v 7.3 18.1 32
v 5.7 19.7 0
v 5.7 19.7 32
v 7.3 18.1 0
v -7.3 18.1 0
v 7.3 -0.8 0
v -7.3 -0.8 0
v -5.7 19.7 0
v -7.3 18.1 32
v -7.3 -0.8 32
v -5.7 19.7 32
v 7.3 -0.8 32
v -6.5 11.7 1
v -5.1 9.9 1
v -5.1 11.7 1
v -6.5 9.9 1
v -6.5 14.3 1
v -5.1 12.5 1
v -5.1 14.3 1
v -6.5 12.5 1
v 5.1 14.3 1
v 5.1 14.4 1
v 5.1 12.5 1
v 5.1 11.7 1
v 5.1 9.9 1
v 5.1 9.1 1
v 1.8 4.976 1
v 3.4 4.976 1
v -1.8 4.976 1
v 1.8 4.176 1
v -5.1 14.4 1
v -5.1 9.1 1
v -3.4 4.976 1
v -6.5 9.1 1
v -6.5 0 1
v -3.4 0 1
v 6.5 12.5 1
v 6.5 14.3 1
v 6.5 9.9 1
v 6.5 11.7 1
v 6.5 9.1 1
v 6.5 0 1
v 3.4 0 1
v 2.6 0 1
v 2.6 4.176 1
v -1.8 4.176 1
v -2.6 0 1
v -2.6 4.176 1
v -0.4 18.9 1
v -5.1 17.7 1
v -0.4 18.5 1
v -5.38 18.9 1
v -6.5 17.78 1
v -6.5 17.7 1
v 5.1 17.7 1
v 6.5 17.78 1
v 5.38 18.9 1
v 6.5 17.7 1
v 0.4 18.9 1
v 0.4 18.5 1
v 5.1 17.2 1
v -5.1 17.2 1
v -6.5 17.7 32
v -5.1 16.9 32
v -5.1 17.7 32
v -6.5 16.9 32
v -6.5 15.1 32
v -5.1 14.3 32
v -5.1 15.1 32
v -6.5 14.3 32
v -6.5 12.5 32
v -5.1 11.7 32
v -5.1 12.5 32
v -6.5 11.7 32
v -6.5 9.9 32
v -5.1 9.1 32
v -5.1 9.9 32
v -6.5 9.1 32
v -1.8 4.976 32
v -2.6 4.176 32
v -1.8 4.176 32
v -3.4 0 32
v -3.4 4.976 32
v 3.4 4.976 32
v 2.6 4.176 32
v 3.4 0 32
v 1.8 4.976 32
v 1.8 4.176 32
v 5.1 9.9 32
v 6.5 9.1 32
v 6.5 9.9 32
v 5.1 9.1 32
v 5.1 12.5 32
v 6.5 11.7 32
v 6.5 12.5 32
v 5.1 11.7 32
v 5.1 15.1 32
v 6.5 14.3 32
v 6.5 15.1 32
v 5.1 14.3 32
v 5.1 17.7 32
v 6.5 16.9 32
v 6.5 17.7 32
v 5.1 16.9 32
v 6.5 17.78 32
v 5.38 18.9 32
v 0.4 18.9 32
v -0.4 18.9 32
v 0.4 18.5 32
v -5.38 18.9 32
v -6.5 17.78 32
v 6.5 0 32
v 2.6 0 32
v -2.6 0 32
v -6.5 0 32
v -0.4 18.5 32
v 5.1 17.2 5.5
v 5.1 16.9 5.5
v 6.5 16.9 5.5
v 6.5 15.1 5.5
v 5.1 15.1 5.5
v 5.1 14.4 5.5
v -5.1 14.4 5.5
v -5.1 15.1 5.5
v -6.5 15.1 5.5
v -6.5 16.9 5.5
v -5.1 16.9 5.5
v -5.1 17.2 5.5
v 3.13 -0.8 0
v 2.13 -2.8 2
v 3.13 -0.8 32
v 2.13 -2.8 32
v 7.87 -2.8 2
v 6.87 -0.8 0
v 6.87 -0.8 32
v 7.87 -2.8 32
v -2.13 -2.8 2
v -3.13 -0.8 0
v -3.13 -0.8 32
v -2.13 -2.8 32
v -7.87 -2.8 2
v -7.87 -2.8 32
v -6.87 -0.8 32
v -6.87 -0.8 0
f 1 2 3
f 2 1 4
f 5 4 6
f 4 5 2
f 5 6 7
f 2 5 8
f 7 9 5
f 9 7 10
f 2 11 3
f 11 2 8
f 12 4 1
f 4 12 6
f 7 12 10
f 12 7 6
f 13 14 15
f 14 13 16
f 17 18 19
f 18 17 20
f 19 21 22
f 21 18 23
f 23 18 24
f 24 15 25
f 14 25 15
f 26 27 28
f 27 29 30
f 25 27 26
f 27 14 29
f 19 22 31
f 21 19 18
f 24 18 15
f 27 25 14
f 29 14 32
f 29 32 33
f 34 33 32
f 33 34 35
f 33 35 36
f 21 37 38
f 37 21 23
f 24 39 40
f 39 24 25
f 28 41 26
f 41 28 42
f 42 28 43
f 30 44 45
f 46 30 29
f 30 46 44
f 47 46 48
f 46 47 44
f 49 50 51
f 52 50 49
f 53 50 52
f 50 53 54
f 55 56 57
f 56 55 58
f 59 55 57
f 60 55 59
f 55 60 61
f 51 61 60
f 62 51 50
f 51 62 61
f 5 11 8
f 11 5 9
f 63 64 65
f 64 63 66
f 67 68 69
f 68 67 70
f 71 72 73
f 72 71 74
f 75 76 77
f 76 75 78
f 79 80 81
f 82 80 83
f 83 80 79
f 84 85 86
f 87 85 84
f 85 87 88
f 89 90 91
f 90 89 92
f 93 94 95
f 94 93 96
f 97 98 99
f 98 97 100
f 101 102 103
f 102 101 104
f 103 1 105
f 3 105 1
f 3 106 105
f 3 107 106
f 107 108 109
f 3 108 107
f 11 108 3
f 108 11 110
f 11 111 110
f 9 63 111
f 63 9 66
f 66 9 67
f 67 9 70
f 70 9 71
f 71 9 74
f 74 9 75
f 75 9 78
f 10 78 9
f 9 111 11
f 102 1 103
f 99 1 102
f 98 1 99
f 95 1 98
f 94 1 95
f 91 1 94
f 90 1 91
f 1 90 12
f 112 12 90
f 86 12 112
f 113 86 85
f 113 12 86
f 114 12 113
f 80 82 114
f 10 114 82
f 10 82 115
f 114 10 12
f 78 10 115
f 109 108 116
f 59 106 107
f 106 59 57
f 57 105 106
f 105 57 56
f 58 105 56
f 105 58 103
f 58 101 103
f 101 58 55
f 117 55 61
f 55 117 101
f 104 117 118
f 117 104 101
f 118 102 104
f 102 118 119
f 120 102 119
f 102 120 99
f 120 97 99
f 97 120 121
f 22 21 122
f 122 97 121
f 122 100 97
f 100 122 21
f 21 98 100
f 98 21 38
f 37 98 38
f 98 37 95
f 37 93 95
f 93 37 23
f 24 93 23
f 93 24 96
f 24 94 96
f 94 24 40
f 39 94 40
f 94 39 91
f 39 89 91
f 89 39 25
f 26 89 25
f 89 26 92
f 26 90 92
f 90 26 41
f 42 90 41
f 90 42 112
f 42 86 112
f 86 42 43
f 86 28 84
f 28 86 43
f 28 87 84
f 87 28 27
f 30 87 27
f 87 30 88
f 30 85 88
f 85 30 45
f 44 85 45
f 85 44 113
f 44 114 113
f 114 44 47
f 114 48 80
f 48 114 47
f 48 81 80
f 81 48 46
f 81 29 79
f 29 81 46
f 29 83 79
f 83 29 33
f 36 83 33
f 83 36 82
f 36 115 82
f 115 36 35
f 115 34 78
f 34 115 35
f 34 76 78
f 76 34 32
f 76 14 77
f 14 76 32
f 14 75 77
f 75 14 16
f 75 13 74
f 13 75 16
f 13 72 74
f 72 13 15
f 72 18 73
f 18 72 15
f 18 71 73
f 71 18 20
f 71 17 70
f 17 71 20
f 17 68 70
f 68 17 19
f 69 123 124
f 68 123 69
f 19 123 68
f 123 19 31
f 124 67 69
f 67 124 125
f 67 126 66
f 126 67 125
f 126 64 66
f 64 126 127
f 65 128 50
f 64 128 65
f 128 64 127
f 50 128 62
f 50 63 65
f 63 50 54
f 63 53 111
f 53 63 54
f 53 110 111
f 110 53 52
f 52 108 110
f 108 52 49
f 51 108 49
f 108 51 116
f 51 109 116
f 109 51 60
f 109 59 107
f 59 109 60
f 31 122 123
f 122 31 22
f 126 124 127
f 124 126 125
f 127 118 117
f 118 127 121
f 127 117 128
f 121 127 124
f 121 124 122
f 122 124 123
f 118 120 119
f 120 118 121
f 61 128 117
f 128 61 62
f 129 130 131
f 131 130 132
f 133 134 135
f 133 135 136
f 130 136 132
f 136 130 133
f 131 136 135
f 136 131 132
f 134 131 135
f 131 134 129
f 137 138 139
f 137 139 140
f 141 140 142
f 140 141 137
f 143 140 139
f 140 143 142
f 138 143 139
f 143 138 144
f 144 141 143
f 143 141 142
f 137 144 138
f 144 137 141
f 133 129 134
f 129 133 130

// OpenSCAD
// Gehause fuer Hallsensoren des Ankerkettenzaehlers
// 
// 
// Background:
//   - siehe auch Hallsensoren_brd.pdf
//   - Der Sensor wird ueber ein Kabel mit dem 
//     Ankerkettenzaehler von Thomas Gerner verbunden
//   - Am Winschgehaeuse wird eine Montageplatte angeklebt,
//     und das Sensorgehaeuse daraufgeschoben. Die Bauhoehe
//     der Montageplatte plus Sensor darf 25mm nicht ueberschreiten,
//     aber auch nicht wesentlich darunter liegen, damit der Abstand
//     zu den Magneten klein bleibt.
//   - repository: https://github.com/Github6am/am_parts3D
//   - CAD manual: http://www.openscad.org/documentation.html
//
//   - offene Fragen:
//     - wieviel Hoehe braucht der Kleber? derzeit Gesamthoehe 24mm
//     - Schrumpfschlauch auf Kabel ? oder anderer Knickschutz?
//     - board Masse?
//     - Sollen die Sensoren grob in der Board-Flucht liegen oder Z-foermig?
//       ersteres fuehrt zu einem laengeren Gehaeuse.
//
// Andreas Merz 2019-07-20, v0.2 
// GPLv3 or later, see http://www.gnu.org/licenses


// import dovetail and mounting plate definitions
use <raspi_RJ45fix.scad>

// Main dimensions
xbrd=13;       // board width
zbrd=20+8.5;   // board length: 20, Sensors: 8.5
dbrd=1.7;      // board thickness
yout=24-3.5;   // sensor space - mounting plate thickness
wall=0.8;      // wall thickness

//-------------------------------------------
// enclosure for Hallsensor board and wire
//-------------------------------------------
// Die Bauhoehe samt 
module sensorcase2Dhalf() {
    w=wall;      // w: wall thickness
    u=0;         // excess wall thickness at lower part of the case, optional
    c=0.1;       // clearance between ridges
    x=xbrd/2;    // half board width
    y=yout-2*w;  // inner y dimension
    d=dbrd;      // board thickness
    xc=w/2;      // half width of top center ridge
    xf=5/2+c;    // half distance of cable clamp ridges
    xi=x-1.4;    // inset of board fixture
    yf=xf+sqrt((2*xf-w)*w)-0.3+u;  // cable clamp ridge hook
    yk=y-2;      // board 2mm from top
    yj=yk-d-w-c;
    yi=yj-d-w-c;
    yh=yi-d-w-c;
    yc=y-w/2;
    // inner contour
    polygon( points=[[0,u],
       // Kabelhalterung
       [xf,u], [xf,yf],[xf-w,yf],[xf-w,yf+w],[xf+w,yf+w],[xf+w,u],
       [x-u,u],
       // Platinenhalterung
       [x-u,yh],[xi,yh],[xi,yh+w],[x,yh+w],
       [x,yi],  [xi,yi],[xi,yi+w],[x,yi+w],
       [x,yj],  [xi,yj],[xi,yj+w],[x,yj+w],
       [x,yk],  [xi,yk],[xi,yk+w],[x,yk+w],
       // abgeschraegte Ecke
       [x,y-w*1.4],[x-w*1.4,y],
       // Mittelsteg
       [xc,y],[xc,yc],[0,yc],
       // outer contour
       [0,y+w],[x-w,y+w], [x+w,y-w],[x+w,-w],[0,-w]]); // outer contour

}

module sensorcase2D() {
          union() {
             sensorcase2Dhalf();
             mirror() sensorcase2Dhalf();
          }
}

module sensorcase() {
    w=wall;             // w: wall thickness
    hb=1.0;             // bottom
    hc=4.5+hb;          // sensor space depth
    yc=1.7;             // sensor space height
    h=zbrd+hb+2.5;  // overall height, including bottom wall
    x=xbrd/2;           // half board width
    y=yout-2*w;         // inner y dimension

    difference() {
      union() {
          linear_extrude(height = hb) hull() { sensorcase2D(); };  // bottom
          linear_extrude(height = h) 
            sensorcase2D();
          linear_extrude(height = hc)   // sensor support
            polygon( points=[[-x,y-yc],[x,y-yc],[x,y-yc-2-w],[-x,y-yc-2-w]]);
          linear_extrude(height = h)
             translate([ 5,-w,0]) rotate(180) schwalbenschwanz();
          linear_extrude(height = h)
             translate([-5,-w,0]) rotate(180) schwalbenschwanz();
      }
      // avoid broadening of dovetail at the bottom by cutting 45deg
      translate([-(x+2), 0, -w]) rotate([180-45, 0 ,0])  cube([2*(x+2), 5, 5]);
    }
}




//------------- Instances --------------------

//translate([0,0,0]) connectionH(h=40, l=30);
sensorcase();
